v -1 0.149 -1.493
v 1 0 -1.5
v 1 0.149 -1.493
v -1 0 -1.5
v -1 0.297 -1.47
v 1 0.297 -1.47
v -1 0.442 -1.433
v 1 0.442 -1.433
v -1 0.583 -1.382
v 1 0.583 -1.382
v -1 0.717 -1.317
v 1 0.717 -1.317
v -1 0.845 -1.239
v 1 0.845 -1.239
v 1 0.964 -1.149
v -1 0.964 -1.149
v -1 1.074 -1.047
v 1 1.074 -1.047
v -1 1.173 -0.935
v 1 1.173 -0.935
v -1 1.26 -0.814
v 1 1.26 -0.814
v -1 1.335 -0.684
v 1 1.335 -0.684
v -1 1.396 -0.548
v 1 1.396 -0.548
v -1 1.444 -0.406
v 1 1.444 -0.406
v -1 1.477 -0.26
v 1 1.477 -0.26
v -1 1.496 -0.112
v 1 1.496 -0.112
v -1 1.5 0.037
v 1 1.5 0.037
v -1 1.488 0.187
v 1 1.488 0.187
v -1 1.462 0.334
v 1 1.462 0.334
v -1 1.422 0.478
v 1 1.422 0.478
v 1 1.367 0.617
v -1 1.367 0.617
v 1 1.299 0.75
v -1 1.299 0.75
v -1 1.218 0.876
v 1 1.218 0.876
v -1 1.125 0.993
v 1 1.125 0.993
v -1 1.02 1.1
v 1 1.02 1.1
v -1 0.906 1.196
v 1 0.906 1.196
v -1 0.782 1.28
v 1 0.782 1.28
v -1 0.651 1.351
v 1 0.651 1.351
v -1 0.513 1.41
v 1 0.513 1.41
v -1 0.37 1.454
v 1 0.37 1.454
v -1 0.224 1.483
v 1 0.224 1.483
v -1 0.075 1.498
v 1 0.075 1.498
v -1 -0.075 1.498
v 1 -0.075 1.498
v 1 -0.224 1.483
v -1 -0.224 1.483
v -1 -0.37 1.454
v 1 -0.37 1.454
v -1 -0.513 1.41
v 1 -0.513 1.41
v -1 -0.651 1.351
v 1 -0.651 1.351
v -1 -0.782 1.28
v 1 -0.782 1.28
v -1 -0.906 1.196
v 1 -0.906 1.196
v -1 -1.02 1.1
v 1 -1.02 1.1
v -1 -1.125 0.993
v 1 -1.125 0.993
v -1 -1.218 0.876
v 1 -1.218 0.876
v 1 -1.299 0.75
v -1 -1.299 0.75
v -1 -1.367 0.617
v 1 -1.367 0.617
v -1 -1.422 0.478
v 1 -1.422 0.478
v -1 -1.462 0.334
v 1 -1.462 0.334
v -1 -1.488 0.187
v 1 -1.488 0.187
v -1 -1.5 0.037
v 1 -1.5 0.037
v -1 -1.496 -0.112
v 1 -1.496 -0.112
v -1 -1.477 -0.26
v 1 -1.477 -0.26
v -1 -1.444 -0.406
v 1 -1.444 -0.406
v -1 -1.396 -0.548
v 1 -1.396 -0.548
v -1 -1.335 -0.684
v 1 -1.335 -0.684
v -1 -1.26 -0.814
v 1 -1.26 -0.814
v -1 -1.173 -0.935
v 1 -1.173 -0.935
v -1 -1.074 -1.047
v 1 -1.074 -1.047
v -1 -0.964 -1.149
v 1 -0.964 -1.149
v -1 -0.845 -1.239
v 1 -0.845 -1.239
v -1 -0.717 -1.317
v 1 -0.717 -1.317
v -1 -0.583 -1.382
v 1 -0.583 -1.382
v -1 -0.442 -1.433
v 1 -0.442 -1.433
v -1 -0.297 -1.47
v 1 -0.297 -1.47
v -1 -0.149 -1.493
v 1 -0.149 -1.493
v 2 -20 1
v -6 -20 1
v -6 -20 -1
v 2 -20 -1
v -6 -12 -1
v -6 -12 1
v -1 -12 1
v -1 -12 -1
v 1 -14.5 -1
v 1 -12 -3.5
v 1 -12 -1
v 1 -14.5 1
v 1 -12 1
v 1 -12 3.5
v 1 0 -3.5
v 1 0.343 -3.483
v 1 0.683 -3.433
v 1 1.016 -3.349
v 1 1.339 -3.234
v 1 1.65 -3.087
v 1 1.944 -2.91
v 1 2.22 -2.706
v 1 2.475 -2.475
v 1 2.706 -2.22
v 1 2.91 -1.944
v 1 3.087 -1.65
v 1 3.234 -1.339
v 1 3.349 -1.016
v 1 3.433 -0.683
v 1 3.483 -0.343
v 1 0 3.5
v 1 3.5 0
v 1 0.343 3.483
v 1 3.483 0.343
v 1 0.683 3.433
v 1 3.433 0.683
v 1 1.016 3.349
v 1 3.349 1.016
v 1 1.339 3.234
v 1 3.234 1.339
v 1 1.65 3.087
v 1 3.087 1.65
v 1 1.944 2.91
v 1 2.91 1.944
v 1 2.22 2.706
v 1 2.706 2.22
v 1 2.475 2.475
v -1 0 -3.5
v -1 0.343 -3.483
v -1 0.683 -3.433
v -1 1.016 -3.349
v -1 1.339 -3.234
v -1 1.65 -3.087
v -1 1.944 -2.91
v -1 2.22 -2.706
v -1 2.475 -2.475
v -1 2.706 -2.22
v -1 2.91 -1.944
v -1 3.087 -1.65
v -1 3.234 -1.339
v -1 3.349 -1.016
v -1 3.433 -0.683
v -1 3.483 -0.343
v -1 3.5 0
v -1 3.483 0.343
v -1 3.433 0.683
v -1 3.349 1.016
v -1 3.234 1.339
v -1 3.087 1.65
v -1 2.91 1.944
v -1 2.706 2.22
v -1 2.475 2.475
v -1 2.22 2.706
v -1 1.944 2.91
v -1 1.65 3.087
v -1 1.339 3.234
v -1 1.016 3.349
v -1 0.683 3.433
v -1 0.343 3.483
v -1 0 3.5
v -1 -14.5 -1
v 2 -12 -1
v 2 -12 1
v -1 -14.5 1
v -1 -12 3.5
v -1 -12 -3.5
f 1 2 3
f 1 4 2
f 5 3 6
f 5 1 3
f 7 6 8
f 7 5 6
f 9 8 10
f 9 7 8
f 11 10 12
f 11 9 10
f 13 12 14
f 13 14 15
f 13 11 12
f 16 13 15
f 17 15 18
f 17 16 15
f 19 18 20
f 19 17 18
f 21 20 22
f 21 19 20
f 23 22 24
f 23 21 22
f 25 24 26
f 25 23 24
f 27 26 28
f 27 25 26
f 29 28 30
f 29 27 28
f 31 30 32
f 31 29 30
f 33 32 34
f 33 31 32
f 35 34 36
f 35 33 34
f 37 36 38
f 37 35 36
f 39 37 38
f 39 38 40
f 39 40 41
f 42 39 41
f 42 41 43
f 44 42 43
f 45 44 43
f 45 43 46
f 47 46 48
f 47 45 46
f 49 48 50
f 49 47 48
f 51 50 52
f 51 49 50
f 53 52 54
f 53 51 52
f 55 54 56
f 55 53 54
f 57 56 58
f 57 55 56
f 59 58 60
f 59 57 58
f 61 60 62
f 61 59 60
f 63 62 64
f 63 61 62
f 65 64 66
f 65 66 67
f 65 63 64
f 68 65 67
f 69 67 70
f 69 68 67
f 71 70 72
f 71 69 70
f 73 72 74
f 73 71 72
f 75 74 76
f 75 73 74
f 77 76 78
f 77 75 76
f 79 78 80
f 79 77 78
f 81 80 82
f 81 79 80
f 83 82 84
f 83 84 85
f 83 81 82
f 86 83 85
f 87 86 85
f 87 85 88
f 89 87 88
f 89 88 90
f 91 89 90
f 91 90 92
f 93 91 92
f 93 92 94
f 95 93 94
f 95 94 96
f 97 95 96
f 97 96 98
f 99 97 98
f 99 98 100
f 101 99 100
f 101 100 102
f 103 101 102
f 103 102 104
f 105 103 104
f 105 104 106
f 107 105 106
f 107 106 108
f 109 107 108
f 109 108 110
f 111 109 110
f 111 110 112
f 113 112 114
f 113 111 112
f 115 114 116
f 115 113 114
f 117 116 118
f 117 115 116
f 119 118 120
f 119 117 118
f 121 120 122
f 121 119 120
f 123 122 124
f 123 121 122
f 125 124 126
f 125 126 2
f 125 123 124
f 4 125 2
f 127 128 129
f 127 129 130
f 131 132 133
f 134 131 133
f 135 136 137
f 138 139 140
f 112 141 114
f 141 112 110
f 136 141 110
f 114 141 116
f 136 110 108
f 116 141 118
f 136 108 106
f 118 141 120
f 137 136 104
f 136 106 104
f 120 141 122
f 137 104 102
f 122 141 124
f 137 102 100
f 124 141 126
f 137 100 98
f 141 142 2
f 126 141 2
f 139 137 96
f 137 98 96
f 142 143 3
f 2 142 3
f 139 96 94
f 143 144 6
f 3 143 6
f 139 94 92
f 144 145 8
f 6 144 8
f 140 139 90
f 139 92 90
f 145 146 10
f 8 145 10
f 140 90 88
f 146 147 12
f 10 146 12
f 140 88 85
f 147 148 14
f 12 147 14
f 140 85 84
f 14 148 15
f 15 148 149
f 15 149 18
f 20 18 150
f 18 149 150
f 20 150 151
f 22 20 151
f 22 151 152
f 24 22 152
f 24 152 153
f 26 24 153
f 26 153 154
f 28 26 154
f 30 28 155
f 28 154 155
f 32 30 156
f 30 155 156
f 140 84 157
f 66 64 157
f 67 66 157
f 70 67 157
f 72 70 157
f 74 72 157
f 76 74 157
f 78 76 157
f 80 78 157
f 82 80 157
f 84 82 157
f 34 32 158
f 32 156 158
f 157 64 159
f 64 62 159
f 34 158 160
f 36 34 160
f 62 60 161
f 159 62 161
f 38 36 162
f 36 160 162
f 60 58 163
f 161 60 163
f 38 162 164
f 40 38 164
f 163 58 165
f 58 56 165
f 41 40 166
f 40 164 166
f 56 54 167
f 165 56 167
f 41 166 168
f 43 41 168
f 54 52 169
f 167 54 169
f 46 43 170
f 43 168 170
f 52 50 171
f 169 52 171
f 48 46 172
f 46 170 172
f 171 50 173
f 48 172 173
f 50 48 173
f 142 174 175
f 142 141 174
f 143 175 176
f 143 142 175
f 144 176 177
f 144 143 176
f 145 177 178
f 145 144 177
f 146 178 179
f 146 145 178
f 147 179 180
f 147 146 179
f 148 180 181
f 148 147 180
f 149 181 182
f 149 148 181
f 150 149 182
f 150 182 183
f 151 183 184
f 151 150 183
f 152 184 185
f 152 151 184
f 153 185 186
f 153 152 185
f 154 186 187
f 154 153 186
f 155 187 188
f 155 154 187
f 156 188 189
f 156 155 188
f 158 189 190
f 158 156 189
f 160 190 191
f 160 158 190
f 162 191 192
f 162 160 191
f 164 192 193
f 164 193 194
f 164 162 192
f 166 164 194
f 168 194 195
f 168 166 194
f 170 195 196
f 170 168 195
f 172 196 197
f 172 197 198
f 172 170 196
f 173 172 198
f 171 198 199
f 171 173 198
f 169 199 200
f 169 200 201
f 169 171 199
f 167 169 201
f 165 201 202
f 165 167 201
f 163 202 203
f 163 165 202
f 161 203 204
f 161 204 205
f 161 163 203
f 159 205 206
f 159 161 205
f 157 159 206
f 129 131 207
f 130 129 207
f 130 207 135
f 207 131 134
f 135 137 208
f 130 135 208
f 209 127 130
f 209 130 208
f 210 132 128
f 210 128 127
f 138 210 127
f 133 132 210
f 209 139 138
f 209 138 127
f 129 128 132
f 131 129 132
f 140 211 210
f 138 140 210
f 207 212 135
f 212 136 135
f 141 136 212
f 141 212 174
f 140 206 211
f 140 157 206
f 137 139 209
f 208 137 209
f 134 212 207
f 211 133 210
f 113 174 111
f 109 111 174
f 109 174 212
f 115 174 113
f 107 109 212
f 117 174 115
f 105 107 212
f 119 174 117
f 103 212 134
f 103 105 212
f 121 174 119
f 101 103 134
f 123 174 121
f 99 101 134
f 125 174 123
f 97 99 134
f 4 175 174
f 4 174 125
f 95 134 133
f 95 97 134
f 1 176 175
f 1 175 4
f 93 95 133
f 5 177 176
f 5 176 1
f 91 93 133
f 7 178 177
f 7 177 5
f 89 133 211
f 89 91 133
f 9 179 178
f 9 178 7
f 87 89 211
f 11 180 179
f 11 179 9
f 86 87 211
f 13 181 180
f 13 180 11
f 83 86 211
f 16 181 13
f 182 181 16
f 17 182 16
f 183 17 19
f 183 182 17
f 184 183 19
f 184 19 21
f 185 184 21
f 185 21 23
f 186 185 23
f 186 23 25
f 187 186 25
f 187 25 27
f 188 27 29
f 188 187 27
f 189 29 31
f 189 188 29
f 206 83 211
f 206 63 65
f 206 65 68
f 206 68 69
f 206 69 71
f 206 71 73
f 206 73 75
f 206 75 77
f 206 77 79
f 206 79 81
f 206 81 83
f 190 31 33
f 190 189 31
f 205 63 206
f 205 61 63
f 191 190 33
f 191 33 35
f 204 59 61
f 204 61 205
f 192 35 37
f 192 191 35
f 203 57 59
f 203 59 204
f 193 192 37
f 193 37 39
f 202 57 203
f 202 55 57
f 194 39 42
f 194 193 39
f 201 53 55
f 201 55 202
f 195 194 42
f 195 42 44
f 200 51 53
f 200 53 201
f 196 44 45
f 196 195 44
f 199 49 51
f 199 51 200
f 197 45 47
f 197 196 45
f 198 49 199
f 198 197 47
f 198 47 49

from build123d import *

# Parameters (mm, degrees)
SKETCH1_R           = 1.5
BOSS_EXTRUDE1_DEPTH = 1
SKETCH2_W           = 8
SKETCH2_H           = 8
BOSS_EXTRUDE2_DEPTH = 1
BOSS_EXTRUDE3_DEPTH = 1


with BuildPart() as part:
    # Sketch1 → Boss-Extrude1 (new, symmetric)
    with BuildSketch(Plane(origin=(0, 0, 0), x_dir=(0, 0, -1), z_dir=(1, 0, 0))):
        with BuildLine():
            Line((-3.5, 0), (-3.5, -12))
            Line((-3.5, -12), (3.5, -12))
            Line((3.5, -12), (3.5, 0))
            ThreePointArc((3.5, 0), (0, 3.5), (-3.5, 0))
        make_face()
        Circle(SKETCH1_R, mode=Mode.SUBTRACT)
    extrude(amount=BOSS_EXTRUDE1_DEPTH, both=True)

    # Sketch2 → Boss-Extrude2 (add, symmetric)
    with BuildSketch(Plane.XY):
        with Locations((-2, -16)):
            Rectangle(SKETCH2_W, SKETCH2_H)
    extrude(amount=BOSS_EXTRUDE2_DEPTH, both=True)

    # Sketch3 → Boss-Extrude3 (add, symmetric)
    with BuildSketch(Plane(origin=(0, 0, 0), x_dir=(0, 0, -1), z_dir=(1, 0, 0))):
        Polygon((-3.5, -12), (-1, -14.5), (-1, -12), align=None)
        Polygon((1, -12), (3.5, -12), (1, -14.5), align=None)
    extrude(amount=BOSS_EXTRUDE3_DEPTH, both=True)


solid = part.part
